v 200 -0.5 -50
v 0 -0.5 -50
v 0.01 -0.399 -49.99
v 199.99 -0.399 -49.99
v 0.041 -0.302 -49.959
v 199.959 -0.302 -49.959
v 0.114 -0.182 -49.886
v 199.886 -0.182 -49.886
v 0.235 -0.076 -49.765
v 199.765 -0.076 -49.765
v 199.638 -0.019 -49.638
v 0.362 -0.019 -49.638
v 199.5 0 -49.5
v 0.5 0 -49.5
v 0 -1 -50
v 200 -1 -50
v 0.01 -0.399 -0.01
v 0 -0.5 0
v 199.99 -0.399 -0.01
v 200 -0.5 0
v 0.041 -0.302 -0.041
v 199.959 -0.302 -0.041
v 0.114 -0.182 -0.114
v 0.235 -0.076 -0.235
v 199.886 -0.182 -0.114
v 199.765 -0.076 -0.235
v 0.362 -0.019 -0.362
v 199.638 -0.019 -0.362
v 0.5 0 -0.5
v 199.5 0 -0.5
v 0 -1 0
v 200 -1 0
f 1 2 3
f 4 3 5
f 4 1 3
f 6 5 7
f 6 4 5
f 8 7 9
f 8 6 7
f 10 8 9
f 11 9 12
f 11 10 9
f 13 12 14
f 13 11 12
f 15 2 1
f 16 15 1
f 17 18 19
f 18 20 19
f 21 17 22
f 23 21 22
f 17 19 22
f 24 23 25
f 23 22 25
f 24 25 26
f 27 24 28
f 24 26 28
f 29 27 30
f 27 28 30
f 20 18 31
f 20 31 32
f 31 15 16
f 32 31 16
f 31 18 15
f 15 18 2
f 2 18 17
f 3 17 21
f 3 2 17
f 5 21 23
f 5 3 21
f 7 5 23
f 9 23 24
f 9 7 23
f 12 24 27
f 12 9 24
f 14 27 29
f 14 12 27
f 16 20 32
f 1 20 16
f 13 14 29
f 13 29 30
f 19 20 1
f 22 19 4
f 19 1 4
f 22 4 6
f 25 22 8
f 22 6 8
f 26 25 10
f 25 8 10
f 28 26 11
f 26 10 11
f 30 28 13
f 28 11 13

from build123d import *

# Parameters (mm, degrees)
SKETCH_1_W             = 200
SKETCH_1_H             = 50
SM_BASE_FLANGE_1_DEPTH = 1
FILLET_1_R             = 0.5


# Sheet-metal steps are written as plain solids
with BuildPart() as part:
    # Sketch 1 → 基体-法兰1 (new body)
    with BuildSketch(Plane(origin=(0, 0, 0), x_dir=(1, 0, 0), z_dir=(0, 1, 0))):
        with Locations((100, 25)):
            Rectangle(SKETCH_1_W, SKETCH_1_H)
    extrude(amount=-SM_BASE_FLANGE_1_DEPTH)

    # 圆角1
    fillet_1_edges = [part.edges().sort_by_distance(p)[0] for p in [
        (100, 0, -50),
        (200, 0, -25),
        (100, 0, 0),
        (0, 0, -25),
    ]]
    fillet(fillet_1_edges, radius=FILLET_1_R)


solid = part.part
